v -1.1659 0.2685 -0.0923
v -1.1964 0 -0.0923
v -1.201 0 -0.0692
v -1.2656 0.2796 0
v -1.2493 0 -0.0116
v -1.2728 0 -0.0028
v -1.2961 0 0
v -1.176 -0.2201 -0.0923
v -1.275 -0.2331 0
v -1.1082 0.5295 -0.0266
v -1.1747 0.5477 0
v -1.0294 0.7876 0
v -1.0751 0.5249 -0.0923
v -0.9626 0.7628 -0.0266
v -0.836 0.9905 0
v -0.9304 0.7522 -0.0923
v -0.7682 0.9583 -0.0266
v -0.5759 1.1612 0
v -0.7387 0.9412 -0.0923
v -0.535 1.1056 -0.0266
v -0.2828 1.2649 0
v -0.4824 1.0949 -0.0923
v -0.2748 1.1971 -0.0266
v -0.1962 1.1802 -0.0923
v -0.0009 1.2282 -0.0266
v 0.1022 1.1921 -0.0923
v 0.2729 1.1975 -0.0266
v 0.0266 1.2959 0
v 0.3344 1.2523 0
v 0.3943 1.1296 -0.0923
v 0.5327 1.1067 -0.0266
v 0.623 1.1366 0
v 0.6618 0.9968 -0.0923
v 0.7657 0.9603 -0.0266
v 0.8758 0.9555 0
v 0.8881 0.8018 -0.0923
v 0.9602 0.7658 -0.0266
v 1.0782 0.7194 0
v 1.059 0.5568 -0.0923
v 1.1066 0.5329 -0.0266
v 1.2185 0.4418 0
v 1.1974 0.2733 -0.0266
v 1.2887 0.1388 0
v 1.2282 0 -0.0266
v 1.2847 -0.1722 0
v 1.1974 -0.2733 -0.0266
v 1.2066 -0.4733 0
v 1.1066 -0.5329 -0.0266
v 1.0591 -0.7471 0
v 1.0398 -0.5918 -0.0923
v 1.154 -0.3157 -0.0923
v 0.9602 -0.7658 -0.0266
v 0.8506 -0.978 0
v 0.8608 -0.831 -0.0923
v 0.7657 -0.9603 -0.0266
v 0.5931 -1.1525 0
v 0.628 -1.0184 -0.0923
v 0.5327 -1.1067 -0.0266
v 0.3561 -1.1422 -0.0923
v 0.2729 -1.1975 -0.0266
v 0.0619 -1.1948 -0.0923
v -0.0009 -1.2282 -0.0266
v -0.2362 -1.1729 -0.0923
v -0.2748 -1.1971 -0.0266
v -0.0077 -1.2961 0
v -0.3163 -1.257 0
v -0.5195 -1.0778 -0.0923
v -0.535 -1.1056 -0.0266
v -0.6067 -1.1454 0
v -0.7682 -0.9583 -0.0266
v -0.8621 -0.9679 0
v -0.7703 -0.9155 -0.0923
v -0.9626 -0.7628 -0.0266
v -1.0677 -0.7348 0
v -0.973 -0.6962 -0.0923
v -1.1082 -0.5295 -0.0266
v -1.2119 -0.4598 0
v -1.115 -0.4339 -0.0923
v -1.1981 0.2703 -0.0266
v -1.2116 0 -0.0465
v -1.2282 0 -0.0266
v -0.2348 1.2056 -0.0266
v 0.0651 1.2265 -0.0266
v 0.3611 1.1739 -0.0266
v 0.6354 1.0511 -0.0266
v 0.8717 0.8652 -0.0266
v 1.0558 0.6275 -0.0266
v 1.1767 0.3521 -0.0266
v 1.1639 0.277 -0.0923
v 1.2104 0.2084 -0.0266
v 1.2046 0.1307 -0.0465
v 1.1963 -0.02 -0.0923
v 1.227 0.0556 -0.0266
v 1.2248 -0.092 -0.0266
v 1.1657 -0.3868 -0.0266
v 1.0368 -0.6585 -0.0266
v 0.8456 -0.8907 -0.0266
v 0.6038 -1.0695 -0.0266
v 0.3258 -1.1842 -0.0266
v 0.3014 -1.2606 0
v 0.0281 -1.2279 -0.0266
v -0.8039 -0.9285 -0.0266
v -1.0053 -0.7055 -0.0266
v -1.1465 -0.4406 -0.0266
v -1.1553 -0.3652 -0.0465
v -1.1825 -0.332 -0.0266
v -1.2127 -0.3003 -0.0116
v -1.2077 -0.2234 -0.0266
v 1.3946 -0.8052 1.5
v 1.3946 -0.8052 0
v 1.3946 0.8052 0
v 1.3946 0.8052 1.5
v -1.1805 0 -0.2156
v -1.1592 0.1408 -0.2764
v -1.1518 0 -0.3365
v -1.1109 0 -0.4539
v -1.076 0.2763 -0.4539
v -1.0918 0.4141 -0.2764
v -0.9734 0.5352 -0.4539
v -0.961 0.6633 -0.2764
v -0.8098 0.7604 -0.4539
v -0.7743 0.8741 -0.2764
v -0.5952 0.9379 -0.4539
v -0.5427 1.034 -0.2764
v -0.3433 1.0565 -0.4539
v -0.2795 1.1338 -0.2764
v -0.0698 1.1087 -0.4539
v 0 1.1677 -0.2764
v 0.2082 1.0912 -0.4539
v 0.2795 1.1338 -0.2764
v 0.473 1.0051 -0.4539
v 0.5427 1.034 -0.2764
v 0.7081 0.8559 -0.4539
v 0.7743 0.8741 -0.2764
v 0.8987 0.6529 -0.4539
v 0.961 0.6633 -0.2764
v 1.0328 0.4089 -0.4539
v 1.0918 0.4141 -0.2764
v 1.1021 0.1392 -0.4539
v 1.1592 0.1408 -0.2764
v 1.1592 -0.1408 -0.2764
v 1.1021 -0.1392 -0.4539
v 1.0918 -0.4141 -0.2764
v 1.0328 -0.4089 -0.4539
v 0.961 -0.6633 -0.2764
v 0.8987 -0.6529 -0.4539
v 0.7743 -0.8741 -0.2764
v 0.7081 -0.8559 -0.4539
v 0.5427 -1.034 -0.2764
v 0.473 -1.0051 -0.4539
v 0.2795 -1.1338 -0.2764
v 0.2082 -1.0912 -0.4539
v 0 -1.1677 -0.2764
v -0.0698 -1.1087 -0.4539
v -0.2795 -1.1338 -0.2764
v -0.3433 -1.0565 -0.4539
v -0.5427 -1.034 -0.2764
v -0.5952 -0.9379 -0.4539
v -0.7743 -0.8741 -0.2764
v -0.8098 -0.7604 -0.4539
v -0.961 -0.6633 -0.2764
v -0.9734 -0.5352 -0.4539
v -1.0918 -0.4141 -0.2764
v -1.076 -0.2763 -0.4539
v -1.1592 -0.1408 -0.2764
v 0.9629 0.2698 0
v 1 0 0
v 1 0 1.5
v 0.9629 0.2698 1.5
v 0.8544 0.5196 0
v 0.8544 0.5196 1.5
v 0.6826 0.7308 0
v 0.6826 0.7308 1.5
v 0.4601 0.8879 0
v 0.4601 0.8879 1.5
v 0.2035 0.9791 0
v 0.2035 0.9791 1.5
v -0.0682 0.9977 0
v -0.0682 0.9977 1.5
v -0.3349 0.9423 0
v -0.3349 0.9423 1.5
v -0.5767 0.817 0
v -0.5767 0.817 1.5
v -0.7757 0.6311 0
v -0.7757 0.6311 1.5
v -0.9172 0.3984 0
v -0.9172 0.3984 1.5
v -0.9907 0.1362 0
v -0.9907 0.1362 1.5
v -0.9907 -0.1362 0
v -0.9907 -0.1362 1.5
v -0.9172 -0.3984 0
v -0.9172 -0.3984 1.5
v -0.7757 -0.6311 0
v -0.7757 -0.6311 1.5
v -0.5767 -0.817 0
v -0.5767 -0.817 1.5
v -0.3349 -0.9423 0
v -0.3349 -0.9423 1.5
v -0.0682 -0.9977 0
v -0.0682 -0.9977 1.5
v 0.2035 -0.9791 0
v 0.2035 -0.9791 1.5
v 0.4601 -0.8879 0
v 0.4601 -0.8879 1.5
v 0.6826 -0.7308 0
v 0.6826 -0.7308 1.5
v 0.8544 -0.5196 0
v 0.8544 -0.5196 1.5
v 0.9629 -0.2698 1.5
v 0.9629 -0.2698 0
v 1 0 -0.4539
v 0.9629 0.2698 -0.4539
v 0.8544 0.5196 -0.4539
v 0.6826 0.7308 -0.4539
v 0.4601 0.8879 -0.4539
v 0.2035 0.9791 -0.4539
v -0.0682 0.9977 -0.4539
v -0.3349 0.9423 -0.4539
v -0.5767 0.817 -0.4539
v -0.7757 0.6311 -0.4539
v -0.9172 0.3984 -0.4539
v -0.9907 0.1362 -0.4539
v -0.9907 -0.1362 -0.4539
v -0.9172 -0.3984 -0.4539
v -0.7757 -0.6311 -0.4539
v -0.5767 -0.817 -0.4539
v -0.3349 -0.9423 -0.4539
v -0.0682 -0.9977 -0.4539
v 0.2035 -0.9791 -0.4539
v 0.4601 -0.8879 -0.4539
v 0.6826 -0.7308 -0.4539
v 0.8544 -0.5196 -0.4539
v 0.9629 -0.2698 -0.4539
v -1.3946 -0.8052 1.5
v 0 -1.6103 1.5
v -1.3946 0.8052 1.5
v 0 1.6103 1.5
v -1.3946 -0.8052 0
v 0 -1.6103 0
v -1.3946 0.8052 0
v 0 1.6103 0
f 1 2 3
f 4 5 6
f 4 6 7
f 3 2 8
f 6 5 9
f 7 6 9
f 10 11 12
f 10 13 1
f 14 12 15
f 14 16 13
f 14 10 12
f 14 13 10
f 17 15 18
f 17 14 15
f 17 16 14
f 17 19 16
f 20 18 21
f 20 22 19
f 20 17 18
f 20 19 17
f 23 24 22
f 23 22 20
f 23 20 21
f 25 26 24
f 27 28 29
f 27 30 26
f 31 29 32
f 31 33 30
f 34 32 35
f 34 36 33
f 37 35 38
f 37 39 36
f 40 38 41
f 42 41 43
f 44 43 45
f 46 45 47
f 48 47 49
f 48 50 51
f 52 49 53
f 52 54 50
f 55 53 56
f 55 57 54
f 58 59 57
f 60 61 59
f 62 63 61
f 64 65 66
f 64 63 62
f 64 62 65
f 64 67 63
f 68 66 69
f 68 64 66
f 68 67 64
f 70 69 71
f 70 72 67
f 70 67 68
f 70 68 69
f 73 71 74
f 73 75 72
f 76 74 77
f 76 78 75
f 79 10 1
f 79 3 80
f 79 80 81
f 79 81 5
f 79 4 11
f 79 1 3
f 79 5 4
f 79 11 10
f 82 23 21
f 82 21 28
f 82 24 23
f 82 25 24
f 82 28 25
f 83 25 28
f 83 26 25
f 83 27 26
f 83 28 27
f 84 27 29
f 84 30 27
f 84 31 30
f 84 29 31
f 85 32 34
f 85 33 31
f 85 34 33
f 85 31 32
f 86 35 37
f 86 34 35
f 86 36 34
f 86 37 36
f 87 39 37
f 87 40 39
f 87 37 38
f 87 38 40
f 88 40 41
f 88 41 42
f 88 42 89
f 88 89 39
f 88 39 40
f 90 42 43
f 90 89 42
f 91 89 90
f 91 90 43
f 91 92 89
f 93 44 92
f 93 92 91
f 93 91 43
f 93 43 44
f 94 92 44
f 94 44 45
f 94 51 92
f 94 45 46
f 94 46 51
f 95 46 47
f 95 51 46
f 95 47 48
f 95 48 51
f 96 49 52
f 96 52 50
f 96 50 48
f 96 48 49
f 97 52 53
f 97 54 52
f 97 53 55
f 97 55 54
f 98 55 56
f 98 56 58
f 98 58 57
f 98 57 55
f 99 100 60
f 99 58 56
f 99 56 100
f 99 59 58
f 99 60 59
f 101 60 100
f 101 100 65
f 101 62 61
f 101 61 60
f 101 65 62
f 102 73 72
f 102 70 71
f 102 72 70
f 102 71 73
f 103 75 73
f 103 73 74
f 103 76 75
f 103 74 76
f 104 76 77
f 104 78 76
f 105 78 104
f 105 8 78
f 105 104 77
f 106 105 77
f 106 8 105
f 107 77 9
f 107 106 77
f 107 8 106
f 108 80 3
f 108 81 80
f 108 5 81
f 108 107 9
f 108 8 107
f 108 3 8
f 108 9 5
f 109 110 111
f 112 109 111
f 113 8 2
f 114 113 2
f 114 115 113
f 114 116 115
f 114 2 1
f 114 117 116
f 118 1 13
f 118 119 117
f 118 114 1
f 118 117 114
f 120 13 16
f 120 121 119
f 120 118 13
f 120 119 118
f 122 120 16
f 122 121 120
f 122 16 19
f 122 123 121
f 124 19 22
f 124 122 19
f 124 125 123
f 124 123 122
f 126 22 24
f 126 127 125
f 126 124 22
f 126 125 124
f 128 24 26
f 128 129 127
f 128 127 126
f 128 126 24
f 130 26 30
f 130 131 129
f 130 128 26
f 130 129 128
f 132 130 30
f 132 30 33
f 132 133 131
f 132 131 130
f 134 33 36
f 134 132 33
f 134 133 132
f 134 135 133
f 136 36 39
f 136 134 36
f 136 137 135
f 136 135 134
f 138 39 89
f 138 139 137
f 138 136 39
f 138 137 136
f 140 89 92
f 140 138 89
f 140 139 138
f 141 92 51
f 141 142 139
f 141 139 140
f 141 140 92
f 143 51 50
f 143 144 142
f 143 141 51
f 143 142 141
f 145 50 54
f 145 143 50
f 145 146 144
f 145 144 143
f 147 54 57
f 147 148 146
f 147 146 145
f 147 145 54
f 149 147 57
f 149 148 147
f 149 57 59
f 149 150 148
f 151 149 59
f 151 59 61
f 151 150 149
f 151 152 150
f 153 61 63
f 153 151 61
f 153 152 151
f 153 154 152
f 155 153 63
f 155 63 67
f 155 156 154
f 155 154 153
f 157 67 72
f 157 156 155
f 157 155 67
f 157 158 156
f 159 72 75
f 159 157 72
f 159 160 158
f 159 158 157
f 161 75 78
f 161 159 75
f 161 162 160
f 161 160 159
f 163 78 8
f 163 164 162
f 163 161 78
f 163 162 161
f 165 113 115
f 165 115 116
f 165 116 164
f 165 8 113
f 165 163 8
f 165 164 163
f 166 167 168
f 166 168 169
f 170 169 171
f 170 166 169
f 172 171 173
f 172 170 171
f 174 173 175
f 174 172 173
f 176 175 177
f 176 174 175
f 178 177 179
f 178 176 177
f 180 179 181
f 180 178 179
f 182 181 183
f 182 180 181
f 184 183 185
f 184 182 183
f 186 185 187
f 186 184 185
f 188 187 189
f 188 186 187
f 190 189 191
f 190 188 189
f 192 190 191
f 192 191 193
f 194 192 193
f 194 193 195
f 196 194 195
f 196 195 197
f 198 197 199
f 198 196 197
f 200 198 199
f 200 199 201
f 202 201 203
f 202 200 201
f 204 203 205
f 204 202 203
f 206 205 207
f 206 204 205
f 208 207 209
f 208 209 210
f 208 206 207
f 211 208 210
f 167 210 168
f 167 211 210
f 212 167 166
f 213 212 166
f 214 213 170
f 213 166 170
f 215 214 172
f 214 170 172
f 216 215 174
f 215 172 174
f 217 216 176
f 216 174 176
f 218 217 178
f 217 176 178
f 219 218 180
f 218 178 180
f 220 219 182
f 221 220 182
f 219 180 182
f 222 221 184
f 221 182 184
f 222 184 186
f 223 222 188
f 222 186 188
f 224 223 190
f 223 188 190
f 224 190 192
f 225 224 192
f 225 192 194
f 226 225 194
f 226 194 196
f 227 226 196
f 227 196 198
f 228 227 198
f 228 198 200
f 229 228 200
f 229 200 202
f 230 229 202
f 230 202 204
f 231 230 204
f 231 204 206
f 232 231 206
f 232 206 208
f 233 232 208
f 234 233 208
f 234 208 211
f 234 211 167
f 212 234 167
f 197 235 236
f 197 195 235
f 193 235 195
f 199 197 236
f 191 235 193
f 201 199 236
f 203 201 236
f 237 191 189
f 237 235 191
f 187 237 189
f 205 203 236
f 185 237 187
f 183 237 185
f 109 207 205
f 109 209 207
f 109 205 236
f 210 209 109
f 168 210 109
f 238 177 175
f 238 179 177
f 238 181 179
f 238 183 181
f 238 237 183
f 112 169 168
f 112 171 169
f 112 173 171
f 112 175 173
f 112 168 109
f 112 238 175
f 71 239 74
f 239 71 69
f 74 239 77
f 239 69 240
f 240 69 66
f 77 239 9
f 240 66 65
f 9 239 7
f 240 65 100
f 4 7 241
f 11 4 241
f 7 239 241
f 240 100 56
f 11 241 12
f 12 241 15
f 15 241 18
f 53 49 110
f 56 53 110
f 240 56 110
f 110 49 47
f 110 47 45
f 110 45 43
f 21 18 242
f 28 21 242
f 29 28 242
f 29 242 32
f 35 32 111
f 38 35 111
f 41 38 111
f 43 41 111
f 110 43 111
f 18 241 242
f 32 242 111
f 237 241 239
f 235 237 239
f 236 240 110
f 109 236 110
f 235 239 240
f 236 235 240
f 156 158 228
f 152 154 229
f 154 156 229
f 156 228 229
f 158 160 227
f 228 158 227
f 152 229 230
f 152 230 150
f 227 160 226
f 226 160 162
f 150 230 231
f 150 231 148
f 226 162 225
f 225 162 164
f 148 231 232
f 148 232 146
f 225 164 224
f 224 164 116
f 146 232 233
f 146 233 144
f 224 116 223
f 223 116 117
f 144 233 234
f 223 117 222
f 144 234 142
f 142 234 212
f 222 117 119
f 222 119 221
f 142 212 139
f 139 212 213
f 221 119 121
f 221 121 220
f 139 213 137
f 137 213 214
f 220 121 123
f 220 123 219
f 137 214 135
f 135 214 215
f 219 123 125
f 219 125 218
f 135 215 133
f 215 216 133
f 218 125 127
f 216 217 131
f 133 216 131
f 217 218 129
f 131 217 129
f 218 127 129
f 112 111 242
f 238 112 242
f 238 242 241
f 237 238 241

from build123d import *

# Parameters (mm, degrees)
SKETCH_1_R          = 1
EXTRUDE_1_DEPTH     = 1.5
CUT_EXTRUDE_START   = -1.5
SKETCH_4_R          = 1
CUT_EXTRUDE_1_DEPTH = 1.5
SKETCH_5_W          = 4.342397196
SKETCH_5_H          = 0.669337657
CUT_EXTRUDE_2_DEPTH = 4.816736312
FILLET_1_R          = 0.1


with BuildPart() as part:
    # 草图1 → 凸台-拉伸1 (new body)
    with BuildSketch(Plane.XY):
        Polygon((0, 1.610326941), (-1.394584039, 0.805163471), (-1.394584039, -0.805163471), (0, -1.610326941), (1.394584039, -0.805163471), (1.394584039, 0.805163471), align=None)
        Circle(SKETCH_1_R, mode=Mode.SUBTRACT)
    extrude(amount=EXTRUDE_1_DEPTH)

    # 草图3 → 旋转1 (revolve)
    with BuildSketch(Plane(origin=(0, 0, 0), x_dir=(1, 0, 0), z_dir=(0, 1, 0))):
        with BuildLine():
            Line((0, 0), (-1.2, 0))
            ThreePointArc((-1.2, 0), (-0.848528137, 0.848528137), (0, 1.2))
            Line((0, 1.2), (0, 0))
        make_face()
    revolve(axis=Axis((0, 0, 0), (0, 0, -1)))

    # 草图4 → 切除-拉伸1 (cut)
    with BuildSketch(Plane.XY.offset(CUT_EXTRUDE_START)):
        Circle(SKETCH_4_R)
    extrude(amount=CUT_EXTRUDE_1_DEPTH, mode=Mode.SUBTRACT)

    # 草图5 → 切除-拉伸2 (cut, through all)
    with BuildSketch(Plane(origin=(-0.69729202, 1.207745206, 0), x_dir=(0.8660254037844382, 0.5000000000000009, 0), z_dir=(-0.5000000000000009, 0.8660254037844383, 0))):
        with Locations((0.228359132, 0.788550397)):
            Rectangle(SKETCH_5_W, SKETCH_5_H)
    extrude(amount=-CUT_EXTRUDE_2_DEPTH, mode=Mode.SUBTRACT)

    # 圆角1
    fillet_1_edges = [part.edges().sort_by_distance(p)[0] for p in [
        (1.2, 0, 0),
    ]]
    fillet(fillet_1_edges, radius=FILLET_1_R)


solid = part.part
